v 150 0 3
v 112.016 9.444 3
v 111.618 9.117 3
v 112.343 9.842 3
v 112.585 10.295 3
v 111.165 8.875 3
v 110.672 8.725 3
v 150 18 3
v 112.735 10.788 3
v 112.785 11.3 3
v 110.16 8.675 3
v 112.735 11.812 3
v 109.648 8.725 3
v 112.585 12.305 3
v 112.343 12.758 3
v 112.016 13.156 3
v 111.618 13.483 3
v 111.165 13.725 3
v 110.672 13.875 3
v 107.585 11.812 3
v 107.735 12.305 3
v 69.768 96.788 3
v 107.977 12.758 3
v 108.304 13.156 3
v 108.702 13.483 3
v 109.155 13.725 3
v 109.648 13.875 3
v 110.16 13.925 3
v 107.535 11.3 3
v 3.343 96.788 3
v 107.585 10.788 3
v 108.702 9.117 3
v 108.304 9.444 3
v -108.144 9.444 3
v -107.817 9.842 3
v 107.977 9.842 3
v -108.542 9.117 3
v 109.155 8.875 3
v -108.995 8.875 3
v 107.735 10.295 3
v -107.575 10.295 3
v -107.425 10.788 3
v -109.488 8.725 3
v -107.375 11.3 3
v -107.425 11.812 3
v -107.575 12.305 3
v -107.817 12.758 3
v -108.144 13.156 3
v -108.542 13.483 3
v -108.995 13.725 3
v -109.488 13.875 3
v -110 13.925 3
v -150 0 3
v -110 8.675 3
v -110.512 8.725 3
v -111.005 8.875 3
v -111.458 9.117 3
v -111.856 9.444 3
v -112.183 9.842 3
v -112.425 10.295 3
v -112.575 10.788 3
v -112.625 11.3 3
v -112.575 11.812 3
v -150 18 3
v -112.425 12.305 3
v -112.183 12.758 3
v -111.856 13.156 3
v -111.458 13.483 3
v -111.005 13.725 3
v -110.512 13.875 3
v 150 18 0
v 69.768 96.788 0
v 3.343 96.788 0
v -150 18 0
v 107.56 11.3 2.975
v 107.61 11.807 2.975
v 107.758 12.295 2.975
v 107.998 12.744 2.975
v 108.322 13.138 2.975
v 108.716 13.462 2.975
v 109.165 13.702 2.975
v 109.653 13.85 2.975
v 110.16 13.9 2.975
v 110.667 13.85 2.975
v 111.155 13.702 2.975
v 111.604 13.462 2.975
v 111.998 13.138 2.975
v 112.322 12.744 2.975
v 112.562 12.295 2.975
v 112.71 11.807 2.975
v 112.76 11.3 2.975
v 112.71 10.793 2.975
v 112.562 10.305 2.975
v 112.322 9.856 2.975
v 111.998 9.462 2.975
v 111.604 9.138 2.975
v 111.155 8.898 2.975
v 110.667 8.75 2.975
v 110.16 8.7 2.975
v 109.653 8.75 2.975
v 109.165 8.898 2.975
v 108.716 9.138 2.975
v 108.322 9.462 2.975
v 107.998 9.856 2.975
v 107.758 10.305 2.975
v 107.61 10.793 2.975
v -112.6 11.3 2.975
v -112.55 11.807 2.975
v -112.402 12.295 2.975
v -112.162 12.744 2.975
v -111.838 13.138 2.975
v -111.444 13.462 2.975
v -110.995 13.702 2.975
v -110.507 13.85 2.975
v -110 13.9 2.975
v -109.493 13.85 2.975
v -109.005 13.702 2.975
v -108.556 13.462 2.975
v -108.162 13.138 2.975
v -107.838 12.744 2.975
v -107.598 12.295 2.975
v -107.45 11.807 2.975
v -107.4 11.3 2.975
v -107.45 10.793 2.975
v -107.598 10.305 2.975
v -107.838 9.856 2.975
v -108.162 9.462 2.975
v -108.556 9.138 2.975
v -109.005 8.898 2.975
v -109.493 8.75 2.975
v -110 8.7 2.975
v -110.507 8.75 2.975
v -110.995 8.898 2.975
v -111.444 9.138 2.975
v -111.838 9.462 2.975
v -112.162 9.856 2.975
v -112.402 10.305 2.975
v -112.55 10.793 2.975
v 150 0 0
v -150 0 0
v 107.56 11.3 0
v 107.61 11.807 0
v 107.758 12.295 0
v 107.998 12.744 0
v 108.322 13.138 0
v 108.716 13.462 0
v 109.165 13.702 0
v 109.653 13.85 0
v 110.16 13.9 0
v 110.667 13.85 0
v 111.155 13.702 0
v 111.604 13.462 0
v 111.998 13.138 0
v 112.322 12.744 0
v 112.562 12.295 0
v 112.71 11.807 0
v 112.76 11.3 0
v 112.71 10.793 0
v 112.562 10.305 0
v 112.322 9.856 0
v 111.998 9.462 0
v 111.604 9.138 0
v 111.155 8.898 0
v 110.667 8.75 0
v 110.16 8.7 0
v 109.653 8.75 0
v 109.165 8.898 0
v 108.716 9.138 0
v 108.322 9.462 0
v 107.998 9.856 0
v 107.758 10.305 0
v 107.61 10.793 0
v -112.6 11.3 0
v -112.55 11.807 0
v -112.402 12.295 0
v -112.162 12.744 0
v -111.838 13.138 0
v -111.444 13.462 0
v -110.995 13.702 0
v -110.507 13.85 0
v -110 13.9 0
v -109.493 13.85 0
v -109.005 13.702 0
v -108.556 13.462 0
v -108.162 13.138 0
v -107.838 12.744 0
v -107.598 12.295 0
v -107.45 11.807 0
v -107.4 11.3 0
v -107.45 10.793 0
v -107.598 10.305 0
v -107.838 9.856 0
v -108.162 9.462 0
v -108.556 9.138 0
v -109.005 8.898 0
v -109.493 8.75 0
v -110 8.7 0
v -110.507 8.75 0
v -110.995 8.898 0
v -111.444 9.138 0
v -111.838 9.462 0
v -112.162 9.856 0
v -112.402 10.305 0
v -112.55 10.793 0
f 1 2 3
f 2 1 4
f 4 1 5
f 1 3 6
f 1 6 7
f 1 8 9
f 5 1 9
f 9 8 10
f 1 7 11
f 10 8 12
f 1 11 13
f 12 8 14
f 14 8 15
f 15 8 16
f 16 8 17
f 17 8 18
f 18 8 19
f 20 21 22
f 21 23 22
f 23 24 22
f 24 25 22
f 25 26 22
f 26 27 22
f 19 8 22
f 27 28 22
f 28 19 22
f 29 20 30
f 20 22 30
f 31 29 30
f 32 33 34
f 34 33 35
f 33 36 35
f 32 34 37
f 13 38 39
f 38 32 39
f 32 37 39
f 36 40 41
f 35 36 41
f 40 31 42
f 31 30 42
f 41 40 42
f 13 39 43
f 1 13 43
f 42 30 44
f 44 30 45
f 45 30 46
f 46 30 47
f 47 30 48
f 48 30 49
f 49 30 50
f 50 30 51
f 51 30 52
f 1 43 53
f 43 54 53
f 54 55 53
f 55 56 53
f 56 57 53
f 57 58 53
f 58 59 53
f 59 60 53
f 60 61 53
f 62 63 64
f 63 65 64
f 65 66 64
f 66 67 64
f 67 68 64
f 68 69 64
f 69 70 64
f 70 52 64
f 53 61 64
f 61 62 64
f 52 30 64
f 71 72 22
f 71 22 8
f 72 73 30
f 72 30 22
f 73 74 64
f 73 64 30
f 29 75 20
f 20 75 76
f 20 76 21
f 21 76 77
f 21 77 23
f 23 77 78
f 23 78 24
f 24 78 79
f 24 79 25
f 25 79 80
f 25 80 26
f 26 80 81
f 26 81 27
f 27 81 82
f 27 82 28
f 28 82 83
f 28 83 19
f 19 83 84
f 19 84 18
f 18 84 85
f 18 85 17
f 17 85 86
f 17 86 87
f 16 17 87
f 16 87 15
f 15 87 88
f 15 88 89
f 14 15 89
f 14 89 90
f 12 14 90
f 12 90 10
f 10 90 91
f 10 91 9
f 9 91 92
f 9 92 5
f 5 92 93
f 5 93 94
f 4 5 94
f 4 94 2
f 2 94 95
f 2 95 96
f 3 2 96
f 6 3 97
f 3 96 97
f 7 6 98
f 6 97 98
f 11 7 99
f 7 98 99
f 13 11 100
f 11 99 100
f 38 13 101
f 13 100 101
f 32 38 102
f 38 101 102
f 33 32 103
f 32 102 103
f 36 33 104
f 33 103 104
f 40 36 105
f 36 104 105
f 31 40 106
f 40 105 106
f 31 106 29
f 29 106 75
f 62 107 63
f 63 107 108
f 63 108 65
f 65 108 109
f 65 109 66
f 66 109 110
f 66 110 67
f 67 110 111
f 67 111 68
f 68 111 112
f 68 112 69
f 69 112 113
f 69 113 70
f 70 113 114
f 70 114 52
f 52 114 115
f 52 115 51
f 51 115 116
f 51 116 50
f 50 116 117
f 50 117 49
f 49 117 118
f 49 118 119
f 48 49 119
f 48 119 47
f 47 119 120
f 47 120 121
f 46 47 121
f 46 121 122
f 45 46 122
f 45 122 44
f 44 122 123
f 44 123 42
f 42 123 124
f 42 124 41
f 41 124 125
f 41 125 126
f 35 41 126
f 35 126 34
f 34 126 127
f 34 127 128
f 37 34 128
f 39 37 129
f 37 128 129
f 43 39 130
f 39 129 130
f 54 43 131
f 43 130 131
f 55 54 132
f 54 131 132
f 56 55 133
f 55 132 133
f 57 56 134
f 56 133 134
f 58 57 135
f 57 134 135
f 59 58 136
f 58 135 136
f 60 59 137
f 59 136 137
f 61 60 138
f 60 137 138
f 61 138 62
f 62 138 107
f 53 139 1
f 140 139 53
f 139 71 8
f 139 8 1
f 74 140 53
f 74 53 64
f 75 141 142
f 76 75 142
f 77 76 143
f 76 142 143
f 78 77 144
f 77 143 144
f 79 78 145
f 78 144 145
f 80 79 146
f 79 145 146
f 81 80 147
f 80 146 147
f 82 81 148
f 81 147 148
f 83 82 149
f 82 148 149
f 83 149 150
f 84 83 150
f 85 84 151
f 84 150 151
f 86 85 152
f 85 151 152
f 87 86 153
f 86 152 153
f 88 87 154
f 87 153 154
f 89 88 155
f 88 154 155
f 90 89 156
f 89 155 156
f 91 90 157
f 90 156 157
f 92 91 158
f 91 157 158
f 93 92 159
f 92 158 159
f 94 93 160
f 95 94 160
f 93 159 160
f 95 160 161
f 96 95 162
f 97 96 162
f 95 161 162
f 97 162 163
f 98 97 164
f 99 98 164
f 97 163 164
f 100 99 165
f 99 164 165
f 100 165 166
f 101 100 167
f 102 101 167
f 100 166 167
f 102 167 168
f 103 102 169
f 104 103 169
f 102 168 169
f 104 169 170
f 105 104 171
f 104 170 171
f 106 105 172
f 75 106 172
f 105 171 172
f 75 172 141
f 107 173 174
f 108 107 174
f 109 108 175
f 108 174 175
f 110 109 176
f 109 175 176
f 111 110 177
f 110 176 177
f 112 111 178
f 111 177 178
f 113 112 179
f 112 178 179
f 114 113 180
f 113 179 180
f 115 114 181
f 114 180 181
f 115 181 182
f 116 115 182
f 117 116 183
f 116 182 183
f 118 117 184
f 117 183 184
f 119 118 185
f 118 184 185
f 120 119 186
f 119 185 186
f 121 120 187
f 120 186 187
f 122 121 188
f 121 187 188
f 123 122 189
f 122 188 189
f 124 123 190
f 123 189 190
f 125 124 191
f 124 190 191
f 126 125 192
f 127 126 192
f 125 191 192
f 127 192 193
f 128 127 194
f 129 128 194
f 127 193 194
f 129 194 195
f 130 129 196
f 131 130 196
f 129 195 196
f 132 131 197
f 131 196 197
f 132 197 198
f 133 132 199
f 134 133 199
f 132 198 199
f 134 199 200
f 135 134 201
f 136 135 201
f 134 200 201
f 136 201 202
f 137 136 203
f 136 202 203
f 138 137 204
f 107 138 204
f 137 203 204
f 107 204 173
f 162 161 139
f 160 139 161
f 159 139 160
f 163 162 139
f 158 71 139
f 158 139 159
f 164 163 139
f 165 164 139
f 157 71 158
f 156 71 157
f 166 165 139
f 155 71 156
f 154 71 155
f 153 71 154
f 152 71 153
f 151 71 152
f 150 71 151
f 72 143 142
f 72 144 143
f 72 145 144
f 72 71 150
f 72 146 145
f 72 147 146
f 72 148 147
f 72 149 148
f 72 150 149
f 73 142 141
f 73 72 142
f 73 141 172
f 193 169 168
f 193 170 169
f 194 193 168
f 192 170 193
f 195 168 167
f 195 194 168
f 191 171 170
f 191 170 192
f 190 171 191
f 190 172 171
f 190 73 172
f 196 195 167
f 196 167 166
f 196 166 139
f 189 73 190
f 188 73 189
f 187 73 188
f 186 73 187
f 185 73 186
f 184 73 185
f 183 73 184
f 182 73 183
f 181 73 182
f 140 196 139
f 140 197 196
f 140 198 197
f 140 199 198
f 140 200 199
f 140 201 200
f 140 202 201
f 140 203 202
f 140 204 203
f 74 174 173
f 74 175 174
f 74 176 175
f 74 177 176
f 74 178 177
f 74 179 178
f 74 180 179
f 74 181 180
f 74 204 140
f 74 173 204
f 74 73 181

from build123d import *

# Parameters (mm, degrees)
Y_KSEKLIK_EKSTR_ZYON1_DEPTH                    = 3
M5_HELISARMAL_I_IN_Z_VANA_MATKAB_3_D           = 5.2
M5_HELISARMAL_I_IN_Z_VANA_MATKAB_3_DEPTH       = 18
M5_HELISARMAL_I_IN_Z_VANA_MATKAB_3_CSINK_D     = 5.25
M5_HELISARMAL_I_IN_Z_VANA_MATKAB_3_CSINK_ANGLE = 90
M5_HELISARMAL_I_IN_Z_VANA_MATKAB_3_TIP         = 1.562237609
M5_HELISARMAL_I_IN_Z_VANA_MATKAB_2_D           = 5.2
M5_HELISARMAL_I_IN_Z_VANA_MATKAB_2_DEPTH       = 18
M5_HELISARMAL_I_IN_Z_VANA_MATKAB_2_CSINK_D     = 5.25
M5_HELISARMAL_I_IN_Z_VANA_MATKAB_2_CSINK_ANGLE = 90
M5_HELISARMAL_I_IN_Z_VANA_MATKAB_2_TIP         = 1.562237609


with BuildPart() as part:
    # Çizim1 → Yükseklik-Ekstrüzyon1 (new body)
    with BuildSketch(Plane.XY):
        Polygon((150, 18), (150, 0), (-150, 0), (-150, 18), (3.342667003, 96.78849493), (69.768417769, 96.78849493), align=None)
    extrude(amount=Y_KSEKLIK_EKSTR_ZYON1_DEPTH)

    # M5 Helisarmal için Zıvana matkabı3
    with Locations(Plane.XY.offset(3)):
        with Locations((-110, 11.3), (110.16, 11.3)):
            CounterSinkHole(M5_HELISARMAL_I_IN_Z_VANA_MATKAB_3_D / 2, M5_HELISARMAL_I_IN_Z_VANA_MATKAB_3_CSINK_D / 2, depth=M5_HELISARMAL_I_IN_Z_VANA_MATKAB_3_DEPTH, counter_sink_angle=M5_HELISARMAL_I_IN_Z_VANA_MATKAB_3_CSINK_ANGLE)
            with Locations((0, 0, -(M5_HELISARMAL_I_IN_Z_VANA_MATKAB_3_DEPTH + M5_HELISARMAL_I_IN_Z_VANA_MATKAB_3_TIP / 2))):  # 118° drill point
                Cone(0, M5_HELISARMAL_I_IN_Z_VANA_MATKAB_3_D / 2, M5_HELISARMAL_I_IN_Z_VANA_MATKAB_3_TIP, mode=Mode.SUBTRACT)

    # M5 Helisarmal için Zıvana matkabı2
    with Locations(Plane.XY.offset(3)):
        with Locations((-110, 11.3), (110.16, 11.3)):
            CounterSinkHole(M5_HELISARMAL_I_IN_Z_VANA_MATKAB_2_D / 2, M5_HELISARMAL_I_IN_Z_VANA_MATKAB_2_CSINK_D / 2, depth=M5_HELISARMAL_I_IN_Z_VANA_MATKAB_2_DEPTH, counter_sink_angle=M5_HELISARMAL_I_IN_Z_VANA_MATKAB_2_CSINK_ANGLE)
            with Locations((0, 0, -(M5_HELISARMAL_I_IN_Z_VANA_MATKAB_2_DEPTH + M5_HELISARMAL_I_IN_Z_VANA_MATKAB_2_TIP / 2))):  # 118° drill point
                Cone(0, M5_HELISARMAL_I_IN_Z_VANA_MATKAB_2_D / 2, M5_HELISARMAL_I_IN_Z_VANA_MATKAB_2_TIP, mode=Mode.SUBTRACT)


solid = part.part
